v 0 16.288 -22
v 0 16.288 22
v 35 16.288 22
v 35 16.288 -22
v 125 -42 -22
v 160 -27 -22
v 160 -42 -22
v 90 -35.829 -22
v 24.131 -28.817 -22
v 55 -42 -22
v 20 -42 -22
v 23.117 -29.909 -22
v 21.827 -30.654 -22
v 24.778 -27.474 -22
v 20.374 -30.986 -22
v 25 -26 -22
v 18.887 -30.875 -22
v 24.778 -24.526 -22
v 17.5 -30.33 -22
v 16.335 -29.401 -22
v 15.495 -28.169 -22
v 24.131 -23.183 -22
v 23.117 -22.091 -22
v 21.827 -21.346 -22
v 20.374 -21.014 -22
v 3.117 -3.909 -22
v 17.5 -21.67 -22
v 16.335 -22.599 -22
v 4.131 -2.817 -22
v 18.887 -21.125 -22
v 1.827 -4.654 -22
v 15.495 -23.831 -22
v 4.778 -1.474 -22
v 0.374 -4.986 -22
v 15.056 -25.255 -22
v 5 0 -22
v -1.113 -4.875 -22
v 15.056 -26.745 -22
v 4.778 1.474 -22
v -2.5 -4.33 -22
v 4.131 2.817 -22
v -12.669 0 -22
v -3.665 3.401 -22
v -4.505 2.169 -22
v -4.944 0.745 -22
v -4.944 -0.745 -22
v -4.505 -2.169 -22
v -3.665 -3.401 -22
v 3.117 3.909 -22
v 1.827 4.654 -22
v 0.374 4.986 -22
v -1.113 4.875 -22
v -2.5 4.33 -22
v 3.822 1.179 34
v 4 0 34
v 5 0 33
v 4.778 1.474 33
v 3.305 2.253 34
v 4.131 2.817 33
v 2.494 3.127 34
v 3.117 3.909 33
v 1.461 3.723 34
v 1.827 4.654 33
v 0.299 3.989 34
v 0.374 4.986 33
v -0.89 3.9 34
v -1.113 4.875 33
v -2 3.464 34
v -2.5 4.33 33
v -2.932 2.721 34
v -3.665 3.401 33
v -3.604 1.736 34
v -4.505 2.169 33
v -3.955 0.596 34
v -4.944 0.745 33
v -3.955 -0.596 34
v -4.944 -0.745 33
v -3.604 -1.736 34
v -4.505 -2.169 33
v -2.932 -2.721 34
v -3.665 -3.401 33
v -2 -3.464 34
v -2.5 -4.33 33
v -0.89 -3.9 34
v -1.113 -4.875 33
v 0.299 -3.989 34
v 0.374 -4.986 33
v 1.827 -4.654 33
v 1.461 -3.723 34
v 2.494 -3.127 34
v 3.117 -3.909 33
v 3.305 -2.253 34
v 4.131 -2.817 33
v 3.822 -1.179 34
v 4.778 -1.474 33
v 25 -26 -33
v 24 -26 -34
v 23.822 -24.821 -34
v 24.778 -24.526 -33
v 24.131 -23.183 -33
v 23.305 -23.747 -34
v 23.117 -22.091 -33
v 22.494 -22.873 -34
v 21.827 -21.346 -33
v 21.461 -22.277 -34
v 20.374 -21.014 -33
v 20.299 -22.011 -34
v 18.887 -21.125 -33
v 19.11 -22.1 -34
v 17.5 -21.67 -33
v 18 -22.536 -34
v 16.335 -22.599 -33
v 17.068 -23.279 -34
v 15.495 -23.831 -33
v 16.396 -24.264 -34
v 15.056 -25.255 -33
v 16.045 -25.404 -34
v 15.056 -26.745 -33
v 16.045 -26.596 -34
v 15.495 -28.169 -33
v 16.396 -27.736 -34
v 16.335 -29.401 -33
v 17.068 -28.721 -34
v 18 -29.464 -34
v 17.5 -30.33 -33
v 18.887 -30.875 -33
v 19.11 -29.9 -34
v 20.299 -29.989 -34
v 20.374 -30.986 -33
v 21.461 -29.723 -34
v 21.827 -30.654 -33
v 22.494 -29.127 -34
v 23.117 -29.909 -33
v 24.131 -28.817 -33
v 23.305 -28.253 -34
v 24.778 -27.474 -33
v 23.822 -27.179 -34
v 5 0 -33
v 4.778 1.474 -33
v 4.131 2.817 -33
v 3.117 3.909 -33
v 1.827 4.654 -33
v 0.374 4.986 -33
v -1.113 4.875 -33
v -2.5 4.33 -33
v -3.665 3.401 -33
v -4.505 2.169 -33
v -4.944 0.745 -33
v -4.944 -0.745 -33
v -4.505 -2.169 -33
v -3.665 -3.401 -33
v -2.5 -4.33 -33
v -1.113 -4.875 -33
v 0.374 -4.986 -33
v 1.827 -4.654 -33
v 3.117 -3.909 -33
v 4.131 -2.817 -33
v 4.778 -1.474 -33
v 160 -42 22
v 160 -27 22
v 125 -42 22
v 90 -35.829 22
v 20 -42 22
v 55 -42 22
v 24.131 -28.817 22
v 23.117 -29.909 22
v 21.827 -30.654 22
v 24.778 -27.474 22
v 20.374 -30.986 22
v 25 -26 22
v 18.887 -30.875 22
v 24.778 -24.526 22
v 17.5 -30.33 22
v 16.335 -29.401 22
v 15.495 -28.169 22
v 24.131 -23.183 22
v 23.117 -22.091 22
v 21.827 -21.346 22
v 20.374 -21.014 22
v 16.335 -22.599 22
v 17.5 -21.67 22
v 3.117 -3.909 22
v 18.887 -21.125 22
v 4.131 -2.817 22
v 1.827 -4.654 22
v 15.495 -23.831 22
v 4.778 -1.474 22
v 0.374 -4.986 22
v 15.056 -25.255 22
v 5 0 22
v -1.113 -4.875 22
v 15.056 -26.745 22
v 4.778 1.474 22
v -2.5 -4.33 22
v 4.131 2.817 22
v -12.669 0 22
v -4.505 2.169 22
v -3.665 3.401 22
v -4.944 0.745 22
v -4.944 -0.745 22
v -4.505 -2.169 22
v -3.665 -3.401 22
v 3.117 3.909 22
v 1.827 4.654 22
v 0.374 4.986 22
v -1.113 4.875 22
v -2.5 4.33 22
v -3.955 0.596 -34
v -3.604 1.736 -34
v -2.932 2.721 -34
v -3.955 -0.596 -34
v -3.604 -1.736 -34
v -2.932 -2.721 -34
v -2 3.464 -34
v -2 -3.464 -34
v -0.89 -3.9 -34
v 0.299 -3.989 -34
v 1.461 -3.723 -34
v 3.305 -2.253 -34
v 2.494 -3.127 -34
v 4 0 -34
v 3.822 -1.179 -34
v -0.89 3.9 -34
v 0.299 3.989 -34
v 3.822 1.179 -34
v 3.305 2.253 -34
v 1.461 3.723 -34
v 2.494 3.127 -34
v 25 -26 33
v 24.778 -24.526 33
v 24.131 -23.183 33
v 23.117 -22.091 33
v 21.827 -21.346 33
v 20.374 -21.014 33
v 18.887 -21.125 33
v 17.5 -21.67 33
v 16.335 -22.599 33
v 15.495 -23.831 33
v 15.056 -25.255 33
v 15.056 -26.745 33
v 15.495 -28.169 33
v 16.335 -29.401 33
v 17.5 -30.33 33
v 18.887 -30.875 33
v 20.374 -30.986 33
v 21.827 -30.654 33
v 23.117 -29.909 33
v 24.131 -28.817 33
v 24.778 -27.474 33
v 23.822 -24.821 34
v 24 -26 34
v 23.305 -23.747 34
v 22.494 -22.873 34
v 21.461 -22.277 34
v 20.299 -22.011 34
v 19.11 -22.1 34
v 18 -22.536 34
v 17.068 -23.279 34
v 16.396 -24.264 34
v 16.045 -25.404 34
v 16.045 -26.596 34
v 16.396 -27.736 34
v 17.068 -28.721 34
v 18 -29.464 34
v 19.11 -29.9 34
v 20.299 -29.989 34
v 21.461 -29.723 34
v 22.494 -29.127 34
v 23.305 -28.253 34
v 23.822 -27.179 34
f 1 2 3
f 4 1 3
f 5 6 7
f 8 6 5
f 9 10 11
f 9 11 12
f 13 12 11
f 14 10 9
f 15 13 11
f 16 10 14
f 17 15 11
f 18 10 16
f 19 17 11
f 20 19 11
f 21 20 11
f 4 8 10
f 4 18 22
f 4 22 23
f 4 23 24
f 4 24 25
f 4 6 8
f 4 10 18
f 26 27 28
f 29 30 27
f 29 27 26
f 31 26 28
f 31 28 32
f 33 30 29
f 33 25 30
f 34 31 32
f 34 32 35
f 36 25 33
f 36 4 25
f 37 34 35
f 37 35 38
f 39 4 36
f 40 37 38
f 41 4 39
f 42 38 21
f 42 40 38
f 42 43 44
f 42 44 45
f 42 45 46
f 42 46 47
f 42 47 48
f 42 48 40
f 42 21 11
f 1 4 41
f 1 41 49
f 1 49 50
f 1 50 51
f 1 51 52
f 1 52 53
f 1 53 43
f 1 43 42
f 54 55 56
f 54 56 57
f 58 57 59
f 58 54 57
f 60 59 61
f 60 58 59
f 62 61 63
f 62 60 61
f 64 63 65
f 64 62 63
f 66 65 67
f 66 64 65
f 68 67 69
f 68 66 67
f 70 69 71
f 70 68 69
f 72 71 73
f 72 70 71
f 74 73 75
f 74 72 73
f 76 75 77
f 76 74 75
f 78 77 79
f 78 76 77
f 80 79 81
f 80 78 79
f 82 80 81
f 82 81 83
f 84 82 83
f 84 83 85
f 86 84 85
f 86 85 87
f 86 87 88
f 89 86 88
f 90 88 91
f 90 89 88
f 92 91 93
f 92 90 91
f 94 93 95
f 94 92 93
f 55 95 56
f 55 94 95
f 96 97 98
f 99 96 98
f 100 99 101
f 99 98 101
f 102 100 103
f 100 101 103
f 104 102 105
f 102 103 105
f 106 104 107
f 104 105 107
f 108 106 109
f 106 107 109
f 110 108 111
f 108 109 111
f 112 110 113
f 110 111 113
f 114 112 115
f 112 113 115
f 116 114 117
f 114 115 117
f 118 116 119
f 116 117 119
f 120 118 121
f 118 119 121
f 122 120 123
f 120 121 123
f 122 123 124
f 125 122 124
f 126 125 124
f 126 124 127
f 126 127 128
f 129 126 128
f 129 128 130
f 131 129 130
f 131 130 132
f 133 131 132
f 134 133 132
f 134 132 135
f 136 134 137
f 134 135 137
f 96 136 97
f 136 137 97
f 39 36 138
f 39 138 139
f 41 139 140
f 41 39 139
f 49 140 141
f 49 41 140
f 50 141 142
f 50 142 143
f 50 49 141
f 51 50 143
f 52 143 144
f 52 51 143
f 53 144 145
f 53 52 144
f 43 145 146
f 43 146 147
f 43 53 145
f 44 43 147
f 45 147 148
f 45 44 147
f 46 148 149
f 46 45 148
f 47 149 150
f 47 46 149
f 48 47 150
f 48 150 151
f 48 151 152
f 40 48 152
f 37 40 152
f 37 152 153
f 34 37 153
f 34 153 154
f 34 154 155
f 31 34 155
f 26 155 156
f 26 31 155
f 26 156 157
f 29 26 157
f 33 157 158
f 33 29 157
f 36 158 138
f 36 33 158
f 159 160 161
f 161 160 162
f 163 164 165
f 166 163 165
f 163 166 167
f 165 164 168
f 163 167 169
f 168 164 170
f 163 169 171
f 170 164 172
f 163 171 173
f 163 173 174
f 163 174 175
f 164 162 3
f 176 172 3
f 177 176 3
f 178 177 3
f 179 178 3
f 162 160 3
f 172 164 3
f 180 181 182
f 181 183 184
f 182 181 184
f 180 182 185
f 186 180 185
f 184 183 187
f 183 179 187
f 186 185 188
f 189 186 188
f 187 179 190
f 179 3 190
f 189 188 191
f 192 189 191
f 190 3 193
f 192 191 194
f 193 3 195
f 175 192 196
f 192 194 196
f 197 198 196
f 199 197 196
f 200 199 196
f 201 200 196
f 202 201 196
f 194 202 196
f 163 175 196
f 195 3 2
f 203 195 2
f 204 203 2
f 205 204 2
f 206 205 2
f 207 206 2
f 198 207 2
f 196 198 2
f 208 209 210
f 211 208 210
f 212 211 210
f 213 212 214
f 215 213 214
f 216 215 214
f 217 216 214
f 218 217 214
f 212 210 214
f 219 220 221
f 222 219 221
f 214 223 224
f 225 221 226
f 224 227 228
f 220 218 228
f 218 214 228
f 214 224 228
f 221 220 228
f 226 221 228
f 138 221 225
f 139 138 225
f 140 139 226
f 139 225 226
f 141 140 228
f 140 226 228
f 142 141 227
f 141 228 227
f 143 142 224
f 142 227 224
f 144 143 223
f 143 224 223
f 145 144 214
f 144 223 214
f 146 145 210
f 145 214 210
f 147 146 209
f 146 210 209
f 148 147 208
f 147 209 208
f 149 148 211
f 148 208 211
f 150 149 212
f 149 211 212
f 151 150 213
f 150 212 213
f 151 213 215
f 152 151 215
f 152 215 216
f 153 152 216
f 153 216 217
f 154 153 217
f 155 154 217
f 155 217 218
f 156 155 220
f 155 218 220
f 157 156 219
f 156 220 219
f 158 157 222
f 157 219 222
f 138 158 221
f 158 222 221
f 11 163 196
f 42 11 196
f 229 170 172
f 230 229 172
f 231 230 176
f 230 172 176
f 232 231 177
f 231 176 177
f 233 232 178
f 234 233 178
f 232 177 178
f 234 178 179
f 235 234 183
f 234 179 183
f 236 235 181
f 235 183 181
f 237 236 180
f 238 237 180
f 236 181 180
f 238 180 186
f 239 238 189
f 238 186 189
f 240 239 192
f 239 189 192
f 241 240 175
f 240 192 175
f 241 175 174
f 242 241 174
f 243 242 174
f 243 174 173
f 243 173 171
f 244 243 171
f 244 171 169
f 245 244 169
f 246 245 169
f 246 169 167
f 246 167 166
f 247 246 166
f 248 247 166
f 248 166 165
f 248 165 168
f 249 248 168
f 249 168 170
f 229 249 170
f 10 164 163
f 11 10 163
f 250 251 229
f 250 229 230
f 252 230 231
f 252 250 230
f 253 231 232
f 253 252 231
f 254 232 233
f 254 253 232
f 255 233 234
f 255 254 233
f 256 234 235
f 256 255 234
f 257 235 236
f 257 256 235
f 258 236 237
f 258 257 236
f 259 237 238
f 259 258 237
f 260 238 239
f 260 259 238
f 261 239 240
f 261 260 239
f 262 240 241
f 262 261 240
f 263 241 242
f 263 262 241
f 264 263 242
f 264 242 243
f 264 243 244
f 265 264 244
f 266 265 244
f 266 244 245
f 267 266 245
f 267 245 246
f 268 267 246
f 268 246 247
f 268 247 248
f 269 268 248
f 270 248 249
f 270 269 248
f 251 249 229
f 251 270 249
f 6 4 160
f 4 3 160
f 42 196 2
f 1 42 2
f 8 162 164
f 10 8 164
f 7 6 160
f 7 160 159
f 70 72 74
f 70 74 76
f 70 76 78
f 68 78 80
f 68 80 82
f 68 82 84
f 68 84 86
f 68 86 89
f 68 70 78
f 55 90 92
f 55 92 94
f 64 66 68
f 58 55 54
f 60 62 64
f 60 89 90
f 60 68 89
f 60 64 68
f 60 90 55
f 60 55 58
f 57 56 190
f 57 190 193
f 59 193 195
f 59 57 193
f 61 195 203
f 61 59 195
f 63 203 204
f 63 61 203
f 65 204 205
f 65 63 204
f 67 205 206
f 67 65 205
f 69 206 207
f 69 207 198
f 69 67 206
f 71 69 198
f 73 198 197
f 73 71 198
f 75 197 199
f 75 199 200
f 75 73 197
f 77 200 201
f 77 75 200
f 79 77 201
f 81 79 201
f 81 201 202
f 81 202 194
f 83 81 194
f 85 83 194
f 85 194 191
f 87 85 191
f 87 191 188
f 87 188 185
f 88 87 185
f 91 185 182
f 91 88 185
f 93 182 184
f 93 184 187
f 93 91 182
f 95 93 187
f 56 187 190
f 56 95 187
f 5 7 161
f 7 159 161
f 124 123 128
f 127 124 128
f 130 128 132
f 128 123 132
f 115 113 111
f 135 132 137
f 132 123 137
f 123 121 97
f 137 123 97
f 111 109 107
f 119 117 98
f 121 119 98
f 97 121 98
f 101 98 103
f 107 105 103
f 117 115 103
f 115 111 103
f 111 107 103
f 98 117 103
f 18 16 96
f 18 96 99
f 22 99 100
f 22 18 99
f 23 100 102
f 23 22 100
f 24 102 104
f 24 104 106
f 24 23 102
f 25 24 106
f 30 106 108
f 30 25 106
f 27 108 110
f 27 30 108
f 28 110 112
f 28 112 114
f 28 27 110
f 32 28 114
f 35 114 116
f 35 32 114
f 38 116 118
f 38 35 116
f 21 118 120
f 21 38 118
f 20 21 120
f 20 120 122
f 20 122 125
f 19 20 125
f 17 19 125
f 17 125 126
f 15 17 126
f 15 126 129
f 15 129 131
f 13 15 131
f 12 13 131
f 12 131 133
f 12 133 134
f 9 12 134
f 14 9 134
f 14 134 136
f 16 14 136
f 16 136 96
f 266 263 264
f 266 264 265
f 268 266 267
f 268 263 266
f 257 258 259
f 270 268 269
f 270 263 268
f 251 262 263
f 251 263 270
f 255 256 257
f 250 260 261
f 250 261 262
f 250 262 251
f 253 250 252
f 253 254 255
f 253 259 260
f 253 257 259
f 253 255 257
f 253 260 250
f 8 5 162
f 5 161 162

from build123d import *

# Parameters (mm, degrees)
ESQUISSE1_R          = 5
BASE_EXTRUSION_DEPTH = 22
ESQUISSE2_R          = 5
AXES_DEPTH           = 34
CHANFREIN1_SIZE      = 1


with BuildPart() as part:
    # Esquisse1 → Base-Extrusion (new, symmetric)
    with BuildSketch(Plane.XY):
        Polygon((0, 16.287511178), (35, 16.287511178), (160, -27), (160, -42), (125, -42), (90, -35.828555675), (55, -42), (20, -42), (-12.668949544, 0), align=None)
        Circle(ESQUISSE1_R, mode=Mode.SUBTRACT)
        with Locations((20, -26)):
            Circle(ESQUISSE1_R, mode=Mode.SUBTRACT)
    extrude(amount=BASE_EXTRUSION_DEPTH, both=True)

    # Esquisse2 → Axes (add, symmetric)
    with BuildSketch(Plane.XY):
        with Locations((20, -26)):
            Circle(ESQUISSE2_R)
        Circle(ESQUISSE2_R)
    extrude(amount=AXES_DEPTH, both=True)

    # Chanfrein1
    chanfrein1_edges = [part.edges().sort_by_distance(p)[0] for p in [
        (15, -26, -34),
        (-5, 0, -34),
        (-5, 0, 34),
        (15, -26, 34),
    ]]
    chamfer(chanfrein1_edges, length=CHANFREIN1_SIZE)


solid = part.part
